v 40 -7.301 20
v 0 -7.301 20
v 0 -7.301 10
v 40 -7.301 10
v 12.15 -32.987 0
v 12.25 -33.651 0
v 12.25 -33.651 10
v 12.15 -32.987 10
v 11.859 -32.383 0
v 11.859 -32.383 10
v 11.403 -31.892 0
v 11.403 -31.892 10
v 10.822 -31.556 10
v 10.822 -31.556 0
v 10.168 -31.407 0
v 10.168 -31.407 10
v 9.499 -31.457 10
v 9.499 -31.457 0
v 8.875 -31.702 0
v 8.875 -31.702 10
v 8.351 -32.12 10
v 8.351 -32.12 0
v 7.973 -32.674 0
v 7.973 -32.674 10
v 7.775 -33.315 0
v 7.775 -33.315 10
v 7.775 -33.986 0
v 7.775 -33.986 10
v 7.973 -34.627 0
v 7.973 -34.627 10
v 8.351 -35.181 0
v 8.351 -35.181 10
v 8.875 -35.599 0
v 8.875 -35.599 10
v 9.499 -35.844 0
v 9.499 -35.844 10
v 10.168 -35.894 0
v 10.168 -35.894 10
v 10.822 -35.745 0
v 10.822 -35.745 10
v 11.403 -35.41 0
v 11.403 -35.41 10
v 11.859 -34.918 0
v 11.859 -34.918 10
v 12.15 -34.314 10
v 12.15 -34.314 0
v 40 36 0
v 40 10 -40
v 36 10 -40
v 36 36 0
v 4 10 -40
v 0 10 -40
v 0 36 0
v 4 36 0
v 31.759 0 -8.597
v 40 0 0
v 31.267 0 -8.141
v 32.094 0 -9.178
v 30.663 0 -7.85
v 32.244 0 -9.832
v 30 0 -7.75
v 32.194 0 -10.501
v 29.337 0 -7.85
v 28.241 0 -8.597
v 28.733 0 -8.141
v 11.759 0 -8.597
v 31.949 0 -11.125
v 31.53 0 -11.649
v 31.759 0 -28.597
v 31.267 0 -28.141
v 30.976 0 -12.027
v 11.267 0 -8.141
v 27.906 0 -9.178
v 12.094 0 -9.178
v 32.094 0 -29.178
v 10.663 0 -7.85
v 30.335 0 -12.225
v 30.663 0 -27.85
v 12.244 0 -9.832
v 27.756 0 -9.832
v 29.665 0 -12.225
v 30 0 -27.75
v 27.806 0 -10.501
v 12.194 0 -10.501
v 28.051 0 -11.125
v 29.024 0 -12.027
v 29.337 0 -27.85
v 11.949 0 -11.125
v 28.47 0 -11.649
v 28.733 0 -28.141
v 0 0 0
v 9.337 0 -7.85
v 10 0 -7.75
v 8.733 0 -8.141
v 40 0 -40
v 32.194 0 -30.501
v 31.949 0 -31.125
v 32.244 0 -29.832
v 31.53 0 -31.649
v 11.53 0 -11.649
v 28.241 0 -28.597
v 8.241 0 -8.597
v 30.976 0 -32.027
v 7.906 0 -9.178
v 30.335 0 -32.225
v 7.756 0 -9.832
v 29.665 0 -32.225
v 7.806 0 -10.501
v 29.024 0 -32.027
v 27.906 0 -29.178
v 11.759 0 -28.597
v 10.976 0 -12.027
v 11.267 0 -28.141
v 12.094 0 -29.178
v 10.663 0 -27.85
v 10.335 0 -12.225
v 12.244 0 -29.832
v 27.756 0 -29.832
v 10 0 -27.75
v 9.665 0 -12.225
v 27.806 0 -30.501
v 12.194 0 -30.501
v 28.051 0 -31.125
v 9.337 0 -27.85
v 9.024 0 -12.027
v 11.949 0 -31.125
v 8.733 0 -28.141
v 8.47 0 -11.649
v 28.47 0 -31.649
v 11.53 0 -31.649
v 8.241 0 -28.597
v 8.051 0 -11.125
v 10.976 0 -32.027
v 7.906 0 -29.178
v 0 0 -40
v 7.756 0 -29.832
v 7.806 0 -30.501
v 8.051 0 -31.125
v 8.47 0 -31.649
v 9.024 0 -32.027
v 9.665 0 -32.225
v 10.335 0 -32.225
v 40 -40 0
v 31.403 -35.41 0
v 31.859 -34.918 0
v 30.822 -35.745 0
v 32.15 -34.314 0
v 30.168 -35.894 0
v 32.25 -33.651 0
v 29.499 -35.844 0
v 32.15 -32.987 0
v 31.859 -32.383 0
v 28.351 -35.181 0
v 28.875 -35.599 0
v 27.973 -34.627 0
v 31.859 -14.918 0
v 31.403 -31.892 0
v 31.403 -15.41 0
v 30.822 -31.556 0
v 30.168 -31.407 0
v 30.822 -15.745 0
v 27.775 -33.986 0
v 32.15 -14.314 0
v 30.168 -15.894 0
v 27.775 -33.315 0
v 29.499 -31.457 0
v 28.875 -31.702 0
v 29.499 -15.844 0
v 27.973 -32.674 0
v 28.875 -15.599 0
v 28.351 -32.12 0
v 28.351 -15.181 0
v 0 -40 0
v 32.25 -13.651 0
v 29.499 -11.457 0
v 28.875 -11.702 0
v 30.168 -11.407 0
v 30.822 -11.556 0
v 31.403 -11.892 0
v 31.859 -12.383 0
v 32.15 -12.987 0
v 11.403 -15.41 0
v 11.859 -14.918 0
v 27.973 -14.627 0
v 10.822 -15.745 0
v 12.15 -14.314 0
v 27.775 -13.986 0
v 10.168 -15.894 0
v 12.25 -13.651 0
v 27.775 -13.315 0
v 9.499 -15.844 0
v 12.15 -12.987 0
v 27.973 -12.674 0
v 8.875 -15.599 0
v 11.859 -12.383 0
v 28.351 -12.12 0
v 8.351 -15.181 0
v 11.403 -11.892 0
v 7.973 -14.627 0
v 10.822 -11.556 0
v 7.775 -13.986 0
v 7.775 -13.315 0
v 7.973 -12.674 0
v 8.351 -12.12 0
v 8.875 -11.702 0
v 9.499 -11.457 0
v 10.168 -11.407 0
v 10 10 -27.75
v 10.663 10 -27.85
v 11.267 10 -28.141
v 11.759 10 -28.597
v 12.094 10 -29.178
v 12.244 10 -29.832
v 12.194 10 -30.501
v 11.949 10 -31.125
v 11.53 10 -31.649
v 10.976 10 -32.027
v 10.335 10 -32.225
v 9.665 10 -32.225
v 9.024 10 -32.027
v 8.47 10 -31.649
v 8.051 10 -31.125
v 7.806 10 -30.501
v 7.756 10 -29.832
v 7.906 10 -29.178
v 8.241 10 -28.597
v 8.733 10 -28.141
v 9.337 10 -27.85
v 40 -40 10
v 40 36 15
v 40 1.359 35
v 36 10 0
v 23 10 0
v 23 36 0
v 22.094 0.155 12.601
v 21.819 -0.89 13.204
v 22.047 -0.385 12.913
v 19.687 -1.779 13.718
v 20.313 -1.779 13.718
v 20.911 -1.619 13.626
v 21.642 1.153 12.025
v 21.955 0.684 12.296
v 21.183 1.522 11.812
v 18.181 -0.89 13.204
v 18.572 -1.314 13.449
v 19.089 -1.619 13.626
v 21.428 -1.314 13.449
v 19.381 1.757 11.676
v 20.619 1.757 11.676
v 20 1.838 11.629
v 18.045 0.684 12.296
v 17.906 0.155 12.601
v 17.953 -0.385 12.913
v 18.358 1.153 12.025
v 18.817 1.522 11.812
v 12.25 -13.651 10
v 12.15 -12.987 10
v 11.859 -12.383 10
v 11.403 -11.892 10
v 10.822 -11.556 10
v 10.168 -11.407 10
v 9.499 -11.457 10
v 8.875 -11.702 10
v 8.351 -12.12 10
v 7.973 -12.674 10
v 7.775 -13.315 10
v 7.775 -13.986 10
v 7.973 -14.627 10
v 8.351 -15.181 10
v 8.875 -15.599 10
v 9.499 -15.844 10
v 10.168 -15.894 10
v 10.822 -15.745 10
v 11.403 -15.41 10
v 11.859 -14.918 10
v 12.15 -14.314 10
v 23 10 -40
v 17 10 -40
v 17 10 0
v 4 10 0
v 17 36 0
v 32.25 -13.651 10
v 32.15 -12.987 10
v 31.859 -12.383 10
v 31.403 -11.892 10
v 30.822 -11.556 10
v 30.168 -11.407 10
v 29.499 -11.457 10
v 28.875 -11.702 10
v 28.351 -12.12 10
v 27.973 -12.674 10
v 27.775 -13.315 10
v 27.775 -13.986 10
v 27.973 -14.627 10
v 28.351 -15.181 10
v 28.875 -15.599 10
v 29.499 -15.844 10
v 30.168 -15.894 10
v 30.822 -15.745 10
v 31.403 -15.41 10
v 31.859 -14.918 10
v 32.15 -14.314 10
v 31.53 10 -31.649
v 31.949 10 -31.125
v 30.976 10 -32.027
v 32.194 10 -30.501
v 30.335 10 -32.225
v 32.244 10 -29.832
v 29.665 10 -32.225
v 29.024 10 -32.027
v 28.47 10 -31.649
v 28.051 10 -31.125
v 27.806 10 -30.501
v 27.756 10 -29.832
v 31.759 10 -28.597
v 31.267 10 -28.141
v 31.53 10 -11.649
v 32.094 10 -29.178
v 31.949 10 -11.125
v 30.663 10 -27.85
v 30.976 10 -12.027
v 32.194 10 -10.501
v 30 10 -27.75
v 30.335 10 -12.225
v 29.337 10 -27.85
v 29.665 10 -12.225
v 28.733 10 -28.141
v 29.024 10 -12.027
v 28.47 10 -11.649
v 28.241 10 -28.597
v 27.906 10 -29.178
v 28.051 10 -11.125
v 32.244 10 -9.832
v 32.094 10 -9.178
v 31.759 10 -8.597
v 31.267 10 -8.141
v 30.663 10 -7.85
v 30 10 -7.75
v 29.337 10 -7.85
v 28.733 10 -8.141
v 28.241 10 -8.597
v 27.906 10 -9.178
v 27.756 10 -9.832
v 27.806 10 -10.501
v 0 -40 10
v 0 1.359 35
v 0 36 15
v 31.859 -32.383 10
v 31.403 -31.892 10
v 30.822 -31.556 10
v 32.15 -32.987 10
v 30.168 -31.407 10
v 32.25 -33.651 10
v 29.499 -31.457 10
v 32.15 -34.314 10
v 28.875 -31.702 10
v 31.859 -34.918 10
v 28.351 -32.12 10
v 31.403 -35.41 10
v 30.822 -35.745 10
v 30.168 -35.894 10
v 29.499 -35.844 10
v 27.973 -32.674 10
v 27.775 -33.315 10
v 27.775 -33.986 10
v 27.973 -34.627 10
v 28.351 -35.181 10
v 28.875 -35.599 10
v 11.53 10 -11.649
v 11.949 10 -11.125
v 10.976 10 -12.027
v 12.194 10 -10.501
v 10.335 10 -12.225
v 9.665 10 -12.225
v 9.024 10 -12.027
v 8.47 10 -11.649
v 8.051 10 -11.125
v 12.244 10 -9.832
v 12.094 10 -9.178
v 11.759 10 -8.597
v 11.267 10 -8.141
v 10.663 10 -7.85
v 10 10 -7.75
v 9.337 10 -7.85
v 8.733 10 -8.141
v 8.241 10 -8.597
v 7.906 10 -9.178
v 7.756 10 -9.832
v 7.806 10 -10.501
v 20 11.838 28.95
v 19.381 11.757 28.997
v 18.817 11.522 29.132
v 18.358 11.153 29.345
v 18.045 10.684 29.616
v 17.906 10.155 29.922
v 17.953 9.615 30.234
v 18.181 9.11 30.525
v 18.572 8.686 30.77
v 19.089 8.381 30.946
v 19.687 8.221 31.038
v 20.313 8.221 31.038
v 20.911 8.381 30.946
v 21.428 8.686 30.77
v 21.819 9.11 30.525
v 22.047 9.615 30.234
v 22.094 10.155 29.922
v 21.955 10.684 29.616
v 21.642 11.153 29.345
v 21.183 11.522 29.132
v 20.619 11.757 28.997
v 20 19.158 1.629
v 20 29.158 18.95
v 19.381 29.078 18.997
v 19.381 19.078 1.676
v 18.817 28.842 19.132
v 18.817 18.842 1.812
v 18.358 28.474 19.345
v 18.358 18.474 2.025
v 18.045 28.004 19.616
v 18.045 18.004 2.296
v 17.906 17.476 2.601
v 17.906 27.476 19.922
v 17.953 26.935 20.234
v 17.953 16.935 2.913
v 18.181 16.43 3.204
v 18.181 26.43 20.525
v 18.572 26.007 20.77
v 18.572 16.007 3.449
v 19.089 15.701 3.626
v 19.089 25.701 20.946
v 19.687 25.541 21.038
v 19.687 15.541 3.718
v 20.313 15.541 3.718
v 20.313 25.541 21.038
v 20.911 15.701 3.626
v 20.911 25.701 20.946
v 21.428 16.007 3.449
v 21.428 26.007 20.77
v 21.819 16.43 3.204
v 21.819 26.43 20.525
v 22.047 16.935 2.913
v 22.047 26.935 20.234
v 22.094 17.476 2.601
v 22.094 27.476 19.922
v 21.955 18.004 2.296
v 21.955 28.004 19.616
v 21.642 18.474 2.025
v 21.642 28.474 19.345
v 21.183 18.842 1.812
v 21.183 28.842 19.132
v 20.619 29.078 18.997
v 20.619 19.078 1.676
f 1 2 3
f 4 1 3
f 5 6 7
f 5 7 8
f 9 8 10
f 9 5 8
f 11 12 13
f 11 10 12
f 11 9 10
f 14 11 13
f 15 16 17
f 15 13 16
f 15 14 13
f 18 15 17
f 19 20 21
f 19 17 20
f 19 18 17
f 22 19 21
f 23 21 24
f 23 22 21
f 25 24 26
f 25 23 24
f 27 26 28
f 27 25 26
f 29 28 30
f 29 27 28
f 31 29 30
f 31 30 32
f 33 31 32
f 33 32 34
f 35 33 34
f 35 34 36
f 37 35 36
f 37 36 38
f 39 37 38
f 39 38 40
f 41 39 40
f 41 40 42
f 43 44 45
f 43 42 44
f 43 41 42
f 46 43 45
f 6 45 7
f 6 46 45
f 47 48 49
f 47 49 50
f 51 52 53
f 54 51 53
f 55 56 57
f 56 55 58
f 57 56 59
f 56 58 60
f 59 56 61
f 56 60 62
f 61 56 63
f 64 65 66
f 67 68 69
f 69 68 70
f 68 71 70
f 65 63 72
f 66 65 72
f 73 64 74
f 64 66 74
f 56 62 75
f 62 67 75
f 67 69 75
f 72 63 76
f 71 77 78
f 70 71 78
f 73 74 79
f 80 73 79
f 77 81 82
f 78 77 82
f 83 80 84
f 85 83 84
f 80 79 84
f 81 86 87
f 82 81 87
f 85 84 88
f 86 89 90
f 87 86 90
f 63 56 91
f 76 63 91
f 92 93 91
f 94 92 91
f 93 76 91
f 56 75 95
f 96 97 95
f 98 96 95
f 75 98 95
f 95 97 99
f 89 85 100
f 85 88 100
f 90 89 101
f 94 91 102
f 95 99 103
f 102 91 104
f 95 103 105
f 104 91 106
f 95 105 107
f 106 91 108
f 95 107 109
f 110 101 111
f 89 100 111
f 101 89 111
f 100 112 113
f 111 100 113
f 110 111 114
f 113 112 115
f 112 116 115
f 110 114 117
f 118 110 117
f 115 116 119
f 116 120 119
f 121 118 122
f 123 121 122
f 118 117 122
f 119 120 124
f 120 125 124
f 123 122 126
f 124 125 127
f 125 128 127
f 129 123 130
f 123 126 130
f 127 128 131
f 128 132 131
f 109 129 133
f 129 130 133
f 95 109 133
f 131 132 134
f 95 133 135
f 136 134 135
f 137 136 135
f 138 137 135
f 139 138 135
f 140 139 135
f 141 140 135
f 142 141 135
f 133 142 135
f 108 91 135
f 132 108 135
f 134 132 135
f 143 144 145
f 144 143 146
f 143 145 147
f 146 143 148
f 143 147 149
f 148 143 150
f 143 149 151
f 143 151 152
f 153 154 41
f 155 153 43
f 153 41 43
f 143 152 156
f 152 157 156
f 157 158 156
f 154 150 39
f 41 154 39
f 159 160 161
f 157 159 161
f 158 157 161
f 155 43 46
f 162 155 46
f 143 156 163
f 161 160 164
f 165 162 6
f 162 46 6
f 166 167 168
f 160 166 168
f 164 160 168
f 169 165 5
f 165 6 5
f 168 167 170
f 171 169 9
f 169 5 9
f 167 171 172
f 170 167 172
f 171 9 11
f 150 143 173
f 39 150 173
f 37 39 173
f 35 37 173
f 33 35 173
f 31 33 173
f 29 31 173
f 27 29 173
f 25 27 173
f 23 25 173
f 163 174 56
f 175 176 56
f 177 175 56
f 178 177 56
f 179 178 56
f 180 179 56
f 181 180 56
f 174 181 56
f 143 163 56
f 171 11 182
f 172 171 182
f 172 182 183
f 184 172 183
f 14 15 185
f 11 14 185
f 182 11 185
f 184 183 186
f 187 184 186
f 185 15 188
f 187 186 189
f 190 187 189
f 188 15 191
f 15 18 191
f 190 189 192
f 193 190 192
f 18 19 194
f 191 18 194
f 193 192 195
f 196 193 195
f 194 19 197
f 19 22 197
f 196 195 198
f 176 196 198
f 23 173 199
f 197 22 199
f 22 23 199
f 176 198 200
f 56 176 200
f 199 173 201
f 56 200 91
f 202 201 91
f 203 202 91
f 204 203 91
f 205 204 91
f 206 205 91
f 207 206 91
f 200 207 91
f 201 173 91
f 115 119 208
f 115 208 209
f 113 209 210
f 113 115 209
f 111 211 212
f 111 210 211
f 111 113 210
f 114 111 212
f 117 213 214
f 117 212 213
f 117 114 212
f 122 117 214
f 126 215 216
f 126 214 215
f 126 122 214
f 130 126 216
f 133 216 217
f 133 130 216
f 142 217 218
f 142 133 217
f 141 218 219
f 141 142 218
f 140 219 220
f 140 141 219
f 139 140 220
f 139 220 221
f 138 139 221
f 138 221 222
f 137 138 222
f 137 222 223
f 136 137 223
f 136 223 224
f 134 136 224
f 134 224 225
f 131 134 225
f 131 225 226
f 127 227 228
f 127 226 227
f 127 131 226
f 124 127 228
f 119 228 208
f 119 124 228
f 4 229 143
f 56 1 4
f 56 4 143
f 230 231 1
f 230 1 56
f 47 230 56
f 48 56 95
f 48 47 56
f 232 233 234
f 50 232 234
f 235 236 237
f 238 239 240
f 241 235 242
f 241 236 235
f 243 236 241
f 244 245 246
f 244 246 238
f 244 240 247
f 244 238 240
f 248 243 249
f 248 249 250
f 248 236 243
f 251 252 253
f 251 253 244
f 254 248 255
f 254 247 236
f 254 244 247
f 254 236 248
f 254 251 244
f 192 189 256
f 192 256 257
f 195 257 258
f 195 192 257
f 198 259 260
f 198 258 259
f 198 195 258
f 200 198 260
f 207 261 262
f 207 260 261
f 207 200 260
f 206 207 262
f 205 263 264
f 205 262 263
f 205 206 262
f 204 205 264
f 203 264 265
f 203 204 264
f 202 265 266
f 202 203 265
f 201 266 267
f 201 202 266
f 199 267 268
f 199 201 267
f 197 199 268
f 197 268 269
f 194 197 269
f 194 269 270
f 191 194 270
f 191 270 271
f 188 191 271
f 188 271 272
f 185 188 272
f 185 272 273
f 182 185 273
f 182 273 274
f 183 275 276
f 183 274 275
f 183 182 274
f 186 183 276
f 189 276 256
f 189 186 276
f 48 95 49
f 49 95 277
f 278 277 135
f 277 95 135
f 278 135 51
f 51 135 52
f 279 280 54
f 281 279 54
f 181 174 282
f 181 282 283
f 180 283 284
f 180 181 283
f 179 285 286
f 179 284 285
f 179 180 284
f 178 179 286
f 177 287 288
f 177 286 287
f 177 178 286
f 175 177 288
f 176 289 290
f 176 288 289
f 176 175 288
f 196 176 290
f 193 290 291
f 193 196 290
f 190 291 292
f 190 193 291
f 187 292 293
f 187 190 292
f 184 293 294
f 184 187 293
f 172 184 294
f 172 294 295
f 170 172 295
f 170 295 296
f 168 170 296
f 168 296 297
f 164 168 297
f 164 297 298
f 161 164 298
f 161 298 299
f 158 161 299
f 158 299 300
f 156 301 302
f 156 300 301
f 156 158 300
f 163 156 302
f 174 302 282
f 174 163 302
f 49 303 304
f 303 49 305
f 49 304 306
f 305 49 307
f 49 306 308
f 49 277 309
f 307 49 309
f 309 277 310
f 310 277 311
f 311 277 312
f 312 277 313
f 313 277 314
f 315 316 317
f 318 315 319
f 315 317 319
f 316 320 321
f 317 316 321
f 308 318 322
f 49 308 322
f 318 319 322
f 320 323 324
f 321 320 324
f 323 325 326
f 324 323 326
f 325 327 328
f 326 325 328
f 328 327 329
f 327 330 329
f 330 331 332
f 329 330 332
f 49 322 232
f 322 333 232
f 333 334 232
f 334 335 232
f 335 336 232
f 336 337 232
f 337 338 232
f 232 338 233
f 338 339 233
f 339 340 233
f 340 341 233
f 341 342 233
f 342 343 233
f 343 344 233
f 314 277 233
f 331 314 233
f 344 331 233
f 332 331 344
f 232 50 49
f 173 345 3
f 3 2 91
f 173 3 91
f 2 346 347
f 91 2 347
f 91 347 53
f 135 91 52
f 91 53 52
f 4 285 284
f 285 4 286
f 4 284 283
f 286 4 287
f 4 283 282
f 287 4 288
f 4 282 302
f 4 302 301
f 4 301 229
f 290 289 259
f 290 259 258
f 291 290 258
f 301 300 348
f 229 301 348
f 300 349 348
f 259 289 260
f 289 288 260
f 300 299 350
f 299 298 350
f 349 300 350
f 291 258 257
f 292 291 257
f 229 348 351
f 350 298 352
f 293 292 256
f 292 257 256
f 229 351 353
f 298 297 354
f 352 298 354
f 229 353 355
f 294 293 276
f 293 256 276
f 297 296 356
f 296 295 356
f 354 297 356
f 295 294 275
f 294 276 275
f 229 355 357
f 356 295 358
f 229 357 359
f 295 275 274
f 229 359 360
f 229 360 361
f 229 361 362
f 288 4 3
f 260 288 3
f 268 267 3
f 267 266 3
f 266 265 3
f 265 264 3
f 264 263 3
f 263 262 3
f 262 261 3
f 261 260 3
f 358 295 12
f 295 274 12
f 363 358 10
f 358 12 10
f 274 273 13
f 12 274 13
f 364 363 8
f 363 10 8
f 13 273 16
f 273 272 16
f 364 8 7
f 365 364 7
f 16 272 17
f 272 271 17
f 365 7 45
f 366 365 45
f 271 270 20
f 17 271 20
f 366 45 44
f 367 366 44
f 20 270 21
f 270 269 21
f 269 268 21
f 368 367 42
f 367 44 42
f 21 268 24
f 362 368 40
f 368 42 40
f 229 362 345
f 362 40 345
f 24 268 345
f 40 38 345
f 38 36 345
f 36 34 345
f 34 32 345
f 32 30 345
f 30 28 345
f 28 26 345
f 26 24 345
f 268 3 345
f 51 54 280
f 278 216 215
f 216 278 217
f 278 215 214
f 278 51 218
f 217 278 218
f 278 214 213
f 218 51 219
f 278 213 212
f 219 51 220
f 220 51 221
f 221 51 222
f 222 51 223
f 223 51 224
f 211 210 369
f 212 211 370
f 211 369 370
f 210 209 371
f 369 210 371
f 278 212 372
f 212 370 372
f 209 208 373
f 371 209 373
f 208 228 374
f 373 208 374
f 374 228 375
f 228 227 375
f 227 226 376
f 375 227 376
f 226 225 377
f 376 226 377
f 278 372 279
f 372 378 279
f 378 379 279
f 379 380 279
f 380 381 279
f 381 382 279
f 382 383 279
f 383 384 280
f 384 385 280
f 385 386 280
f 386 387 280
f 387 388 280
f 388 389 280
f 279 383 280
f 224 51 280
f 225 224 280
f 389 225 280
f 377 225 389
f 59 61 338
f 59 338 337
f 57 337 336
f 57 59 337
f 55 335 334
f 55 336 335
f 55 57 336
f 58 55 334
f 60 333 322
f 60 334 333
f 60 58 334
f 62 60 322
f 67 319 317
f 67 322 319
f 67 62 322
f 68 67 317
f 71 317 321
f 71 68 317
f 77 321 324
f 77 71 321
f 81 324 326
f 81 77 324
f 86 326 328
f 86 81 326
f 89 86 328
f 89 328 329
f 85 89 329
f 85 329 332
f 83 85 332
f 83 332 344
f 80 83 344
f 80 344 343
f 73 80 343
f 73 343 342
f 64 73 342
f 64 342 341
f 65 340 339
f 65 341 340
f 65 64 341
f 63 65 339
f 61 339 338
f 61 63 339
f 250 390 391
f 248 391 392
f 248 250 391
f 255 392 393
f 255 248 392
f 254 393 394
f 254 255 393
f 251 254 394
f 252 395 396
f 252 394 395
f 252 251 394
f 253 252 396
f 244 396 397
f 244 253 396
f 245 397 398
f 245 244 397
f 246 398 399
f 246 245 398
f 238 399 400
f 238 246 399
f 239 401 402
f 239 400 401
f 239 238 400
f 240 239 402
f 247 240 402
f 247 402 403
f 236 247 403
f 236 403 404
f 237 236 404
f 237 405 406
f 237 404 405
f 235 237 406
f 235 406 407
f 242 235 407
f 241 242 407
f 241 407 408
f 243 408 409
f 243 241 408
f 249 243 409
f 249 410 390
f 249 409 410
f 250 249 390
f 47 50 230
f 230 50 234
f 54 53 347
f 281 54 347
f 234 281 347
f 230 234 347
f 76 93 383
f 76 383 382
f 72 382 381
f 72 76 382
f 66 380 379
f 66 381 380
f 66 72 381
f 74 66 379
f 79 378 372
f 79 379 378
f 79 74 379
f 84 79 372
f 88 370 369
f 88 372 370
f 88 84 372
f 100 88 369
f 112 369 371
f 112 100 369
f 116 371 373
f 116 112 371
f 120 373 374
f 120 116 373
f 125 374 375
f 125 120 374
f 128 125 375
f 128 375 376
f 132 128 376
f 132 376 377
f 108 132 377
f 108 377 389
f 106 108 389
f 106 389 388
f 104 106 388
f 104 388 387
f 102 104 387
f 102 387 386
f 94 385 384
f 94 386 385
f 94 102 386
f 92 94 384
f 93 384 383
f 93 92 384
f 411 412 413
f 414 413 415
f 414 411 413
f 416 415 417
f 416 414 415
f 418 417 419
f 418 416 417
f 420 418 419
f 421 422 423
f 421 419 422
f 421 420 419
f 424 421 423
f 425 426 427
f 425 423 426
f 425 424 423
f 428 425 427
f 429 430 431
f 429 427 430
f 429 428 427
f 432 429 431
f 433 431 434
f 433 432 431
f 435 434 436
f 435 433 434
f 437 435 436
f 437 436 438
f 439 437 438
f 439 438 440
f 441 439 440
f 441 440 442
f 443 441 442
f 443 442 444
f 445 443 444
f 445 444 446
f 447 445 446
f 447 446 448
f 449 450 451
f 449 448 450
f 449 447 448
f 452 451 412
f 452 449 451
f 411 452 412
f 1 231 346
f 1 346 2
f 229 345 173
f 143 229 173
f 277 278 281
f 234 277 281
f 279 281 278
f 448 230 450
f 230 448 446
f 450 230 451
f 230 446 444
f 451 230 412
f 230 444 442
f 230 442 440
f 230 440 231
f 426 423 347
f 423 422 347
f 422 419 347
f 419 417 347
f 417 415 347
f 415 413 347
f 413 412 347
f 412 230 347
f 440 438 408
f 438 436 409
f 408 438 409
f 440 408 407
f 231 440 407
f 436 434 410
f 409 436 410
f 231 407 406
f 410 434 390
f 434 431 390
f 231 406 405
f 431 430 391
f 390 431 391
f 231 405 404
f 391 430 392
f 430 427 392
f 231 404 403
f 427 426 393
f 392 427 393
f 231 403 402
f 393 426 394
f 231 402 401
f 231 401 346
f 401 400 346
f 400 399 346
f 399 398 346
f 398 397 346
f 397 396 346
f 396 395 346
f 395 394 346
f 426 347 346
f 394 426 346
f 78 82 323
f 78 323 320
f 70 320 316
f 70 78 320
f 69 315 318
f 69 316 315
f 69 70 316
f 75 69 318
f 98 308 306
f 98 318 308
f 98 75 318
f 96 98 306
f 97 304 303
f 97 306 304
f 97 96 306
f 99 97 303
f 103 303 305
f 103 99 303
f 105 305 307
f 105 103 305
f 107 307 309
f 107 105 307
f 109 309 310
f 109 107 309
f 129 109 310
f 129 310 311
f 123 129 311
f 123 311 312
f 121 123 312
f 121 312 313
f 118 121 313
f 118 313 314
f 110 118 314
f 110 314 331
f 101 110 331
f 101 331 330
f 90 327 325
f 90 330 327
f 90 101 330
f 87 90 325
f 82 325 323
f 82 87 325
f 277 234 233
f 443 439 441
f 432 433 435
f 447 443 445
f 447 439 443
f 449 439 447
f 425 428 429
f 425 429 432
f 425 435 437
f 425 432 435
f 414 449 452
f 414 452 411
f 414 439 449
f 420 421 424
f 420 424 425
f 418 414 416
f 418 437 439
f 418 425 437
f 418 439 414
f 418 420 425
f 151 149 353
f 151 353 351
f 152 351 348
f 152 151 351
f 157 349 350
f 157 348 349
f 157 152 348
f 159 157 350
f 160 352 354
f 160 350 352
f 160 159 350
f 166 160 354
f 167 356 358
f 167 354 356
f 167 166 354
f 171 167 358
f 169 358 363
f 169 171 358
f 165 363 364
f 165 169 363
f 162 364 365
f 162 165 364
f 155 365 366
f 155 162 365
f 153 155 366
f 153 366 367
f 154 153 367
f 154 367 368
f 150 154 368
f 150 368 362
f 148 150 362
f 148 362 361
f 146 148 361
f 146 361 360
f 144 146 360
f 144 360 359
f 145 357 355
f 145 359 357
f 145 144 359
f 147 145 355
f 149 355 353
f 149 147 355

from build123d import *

# Parameters (mm, degrees)
BOSS_EXTRU_1_DEPTH           = 40
ENL_V_MAT_EXTRU_1_DEPTH      = 76.498344353
ENL_V_MAT_EXTRU_1_DEPTH_BACK = 76.498344353
ESQUISSE2_R                  = 2.25
ENL_V_MAT_EXTRU_2_DEPTH      = 76.498344353
ENL_V_MAT_EXTRU_2_DEPTH_BACK = 76.498344353
ESQUISSE3_R                  = 2.25
ENL_V_MAT_EXTRU_3_DEPTH      = 96.640449297
ENL_V_MAT_EXTRU_3_DEPTH_BACK = 20
ESQUISSE4_R                  = 2.1
BOSS_EXTRU_2_DEPTH           = 4
BOSS_EXTRU_3_START           = -40
BOSS_EXTRU_3_DEPTH           = 4
BOSS_EXTRU_4_DEPTH           = 3
BOSS_EXTRU_4_DEPTH_BACK      = 3
BOSS_EXTRU_4_START           = -20


with BuildPart() as part:
    # Esquisse1 → Boss.-Extru.1 (new body)
    with BuildSketch(Plane(origin=(0, 0, 0), x_dir=(0, 0, -1), z_dir=(1, 0, 0))):
        Polygon((0, 0), (40, 0), (40, 10), (0, 10), (0, 36), (-15, 36), (-35, 1.358983849), (-20, -7.301270189), (-10, -7.301270189), (-10, -40), (0, -40), align=None)
    extrude(amount=BOSS_EXTRU_1_DEPTH)

    # Esquisse2 → Enlèv. mat.-Extru.1 (cut, two sides: drawn at the far end of the back side and taken through both)
    with BuildSketch(Plane(origin=(0, 10, 0), x_dir=(1, 0, 0), z_dir=(0, 1, 0)).offset(-ENL_V_MAT_EXTRU_1_DEPTH_BACK)):
        with Locations(Location((10, 30, 0), (0, 0, 270))):
            Circle(ESQUISSE2_R)
        with Locations(Location((30, 30, 0), (0, 0, 270))):
            Circle(ESQUISSE2_R)
        with Locations(Location((30, 10, 0), (0, 0, 270))):
            Circle(ESQUISSE2_R)
        with Locations(Location((10, 10, 0), (0, 0, 270))):
            Circle(ESQUISSE2_R)
    extrude(amount=ENL_V_MAT_EXTRU_1_DEPTH + ENL_V_MAT_EXTRU_1_DEPTH_BACK, mode=Mode.SUBTRACT)

    # Esquisse3 → Enlèv. mat.-Extru.2 (cut, two sides: drawn at the far end of the back side and taken through both)
    with BuildSketch(Plane.XY.offset(10).offset(-ENL_V_MAT_EXTRU_2_DEPTH_BACK)):
        with Locations((10, -33.650635095)):
            Circle(ESQUISSE3_R)
        with Locations((30, -33.650635095)):
            Circle(ESQUISSE3_R)
        with Locations((30, -13.650635095)):
            Circle(ESQUISSE3_R)
        with Locations((10, -13.650635095)):
            Circle(ESQUISSE3_R)
    extrude(amount=ENL_V_MAT_EXTRU_2_DEPTH + ENL_V_MAT_EXTRU_2_DEPTH_BACK, mode=Mode.SUBTRACT)

    # Esquisse4 → Enlèv. mat.-Extru.3 (cut, two sides: drawn at the far end of the back side and taken through both)
    with BuildSketch(Plane(origin=(0, 15.495190528, 26.838457268), x_dir=(1, 0, 0), z_dir=(0, 0.4999999999999946, 0.8660254037844419)).offset(-ENL_V_MAT_EXTRU_3_DEPTH_BACK)):
        with Locations(Location((20, 13.676914536, 0), (0, 0, 90))):
            Circle(ESQUISSE4_R)
        with Locations(Location((20, -6.323085464, 0), (0, 0, 90))):
            Circle(ESQUISSE4_R)
    extrude(amount=ENL_V_MAT_EXTRU_3_DEPTH + ENL_V_MAT_EXTRU_3_DEPTH_BACK, mode=Mode.SUBTRACT)

    # Esquisse5 → Boss.-Extru.2 (add)
    with BuildSketch(Plane(origin=(40, 0, 0), x_dir=(0, 0, -1), z_dir=(1, 0, 0))):
        Polygon((40, 10), (0, 36), (0, 10), align=None)
    extrude(amount=-BOSS_EXTRU_2_DEPTH)

    # Esquisse5<2> → Boss.-Extru.3 (add)
    with BuildSketch(Plane(origin=(40, 0, 0), x_dir=(0, 0, -1), z_dir=(1, 0, 0)).offset(BOSS_EXTRU_3_START)):
        Polygon((40, 10), (0, 36), (0, 10), align=None)
    extrude(amount=BOSS_EXTRU_3_DEPTH)

    # Esquisse5<3> → Boss.-Extru.4 (add, two sides: drawn at the far end of the back side and taken through both)
    with BuildSketch(Plane(origin=(40, 0, 0), x_dir=(0, 0, -1), z_dir=(1, 0, 0)).offset(BOSS_EXTRU_4_START - BOSS_EXTRU_4_DEPTH_BACK)):
        Polygon((40, 10), (0, 36), (0, 10), align=None)
    extrude(amount=BOSS_EXTRU_4_DEPTH + BOSS_EXTRU_4_DEPTH_BACK)


solid = part.part
